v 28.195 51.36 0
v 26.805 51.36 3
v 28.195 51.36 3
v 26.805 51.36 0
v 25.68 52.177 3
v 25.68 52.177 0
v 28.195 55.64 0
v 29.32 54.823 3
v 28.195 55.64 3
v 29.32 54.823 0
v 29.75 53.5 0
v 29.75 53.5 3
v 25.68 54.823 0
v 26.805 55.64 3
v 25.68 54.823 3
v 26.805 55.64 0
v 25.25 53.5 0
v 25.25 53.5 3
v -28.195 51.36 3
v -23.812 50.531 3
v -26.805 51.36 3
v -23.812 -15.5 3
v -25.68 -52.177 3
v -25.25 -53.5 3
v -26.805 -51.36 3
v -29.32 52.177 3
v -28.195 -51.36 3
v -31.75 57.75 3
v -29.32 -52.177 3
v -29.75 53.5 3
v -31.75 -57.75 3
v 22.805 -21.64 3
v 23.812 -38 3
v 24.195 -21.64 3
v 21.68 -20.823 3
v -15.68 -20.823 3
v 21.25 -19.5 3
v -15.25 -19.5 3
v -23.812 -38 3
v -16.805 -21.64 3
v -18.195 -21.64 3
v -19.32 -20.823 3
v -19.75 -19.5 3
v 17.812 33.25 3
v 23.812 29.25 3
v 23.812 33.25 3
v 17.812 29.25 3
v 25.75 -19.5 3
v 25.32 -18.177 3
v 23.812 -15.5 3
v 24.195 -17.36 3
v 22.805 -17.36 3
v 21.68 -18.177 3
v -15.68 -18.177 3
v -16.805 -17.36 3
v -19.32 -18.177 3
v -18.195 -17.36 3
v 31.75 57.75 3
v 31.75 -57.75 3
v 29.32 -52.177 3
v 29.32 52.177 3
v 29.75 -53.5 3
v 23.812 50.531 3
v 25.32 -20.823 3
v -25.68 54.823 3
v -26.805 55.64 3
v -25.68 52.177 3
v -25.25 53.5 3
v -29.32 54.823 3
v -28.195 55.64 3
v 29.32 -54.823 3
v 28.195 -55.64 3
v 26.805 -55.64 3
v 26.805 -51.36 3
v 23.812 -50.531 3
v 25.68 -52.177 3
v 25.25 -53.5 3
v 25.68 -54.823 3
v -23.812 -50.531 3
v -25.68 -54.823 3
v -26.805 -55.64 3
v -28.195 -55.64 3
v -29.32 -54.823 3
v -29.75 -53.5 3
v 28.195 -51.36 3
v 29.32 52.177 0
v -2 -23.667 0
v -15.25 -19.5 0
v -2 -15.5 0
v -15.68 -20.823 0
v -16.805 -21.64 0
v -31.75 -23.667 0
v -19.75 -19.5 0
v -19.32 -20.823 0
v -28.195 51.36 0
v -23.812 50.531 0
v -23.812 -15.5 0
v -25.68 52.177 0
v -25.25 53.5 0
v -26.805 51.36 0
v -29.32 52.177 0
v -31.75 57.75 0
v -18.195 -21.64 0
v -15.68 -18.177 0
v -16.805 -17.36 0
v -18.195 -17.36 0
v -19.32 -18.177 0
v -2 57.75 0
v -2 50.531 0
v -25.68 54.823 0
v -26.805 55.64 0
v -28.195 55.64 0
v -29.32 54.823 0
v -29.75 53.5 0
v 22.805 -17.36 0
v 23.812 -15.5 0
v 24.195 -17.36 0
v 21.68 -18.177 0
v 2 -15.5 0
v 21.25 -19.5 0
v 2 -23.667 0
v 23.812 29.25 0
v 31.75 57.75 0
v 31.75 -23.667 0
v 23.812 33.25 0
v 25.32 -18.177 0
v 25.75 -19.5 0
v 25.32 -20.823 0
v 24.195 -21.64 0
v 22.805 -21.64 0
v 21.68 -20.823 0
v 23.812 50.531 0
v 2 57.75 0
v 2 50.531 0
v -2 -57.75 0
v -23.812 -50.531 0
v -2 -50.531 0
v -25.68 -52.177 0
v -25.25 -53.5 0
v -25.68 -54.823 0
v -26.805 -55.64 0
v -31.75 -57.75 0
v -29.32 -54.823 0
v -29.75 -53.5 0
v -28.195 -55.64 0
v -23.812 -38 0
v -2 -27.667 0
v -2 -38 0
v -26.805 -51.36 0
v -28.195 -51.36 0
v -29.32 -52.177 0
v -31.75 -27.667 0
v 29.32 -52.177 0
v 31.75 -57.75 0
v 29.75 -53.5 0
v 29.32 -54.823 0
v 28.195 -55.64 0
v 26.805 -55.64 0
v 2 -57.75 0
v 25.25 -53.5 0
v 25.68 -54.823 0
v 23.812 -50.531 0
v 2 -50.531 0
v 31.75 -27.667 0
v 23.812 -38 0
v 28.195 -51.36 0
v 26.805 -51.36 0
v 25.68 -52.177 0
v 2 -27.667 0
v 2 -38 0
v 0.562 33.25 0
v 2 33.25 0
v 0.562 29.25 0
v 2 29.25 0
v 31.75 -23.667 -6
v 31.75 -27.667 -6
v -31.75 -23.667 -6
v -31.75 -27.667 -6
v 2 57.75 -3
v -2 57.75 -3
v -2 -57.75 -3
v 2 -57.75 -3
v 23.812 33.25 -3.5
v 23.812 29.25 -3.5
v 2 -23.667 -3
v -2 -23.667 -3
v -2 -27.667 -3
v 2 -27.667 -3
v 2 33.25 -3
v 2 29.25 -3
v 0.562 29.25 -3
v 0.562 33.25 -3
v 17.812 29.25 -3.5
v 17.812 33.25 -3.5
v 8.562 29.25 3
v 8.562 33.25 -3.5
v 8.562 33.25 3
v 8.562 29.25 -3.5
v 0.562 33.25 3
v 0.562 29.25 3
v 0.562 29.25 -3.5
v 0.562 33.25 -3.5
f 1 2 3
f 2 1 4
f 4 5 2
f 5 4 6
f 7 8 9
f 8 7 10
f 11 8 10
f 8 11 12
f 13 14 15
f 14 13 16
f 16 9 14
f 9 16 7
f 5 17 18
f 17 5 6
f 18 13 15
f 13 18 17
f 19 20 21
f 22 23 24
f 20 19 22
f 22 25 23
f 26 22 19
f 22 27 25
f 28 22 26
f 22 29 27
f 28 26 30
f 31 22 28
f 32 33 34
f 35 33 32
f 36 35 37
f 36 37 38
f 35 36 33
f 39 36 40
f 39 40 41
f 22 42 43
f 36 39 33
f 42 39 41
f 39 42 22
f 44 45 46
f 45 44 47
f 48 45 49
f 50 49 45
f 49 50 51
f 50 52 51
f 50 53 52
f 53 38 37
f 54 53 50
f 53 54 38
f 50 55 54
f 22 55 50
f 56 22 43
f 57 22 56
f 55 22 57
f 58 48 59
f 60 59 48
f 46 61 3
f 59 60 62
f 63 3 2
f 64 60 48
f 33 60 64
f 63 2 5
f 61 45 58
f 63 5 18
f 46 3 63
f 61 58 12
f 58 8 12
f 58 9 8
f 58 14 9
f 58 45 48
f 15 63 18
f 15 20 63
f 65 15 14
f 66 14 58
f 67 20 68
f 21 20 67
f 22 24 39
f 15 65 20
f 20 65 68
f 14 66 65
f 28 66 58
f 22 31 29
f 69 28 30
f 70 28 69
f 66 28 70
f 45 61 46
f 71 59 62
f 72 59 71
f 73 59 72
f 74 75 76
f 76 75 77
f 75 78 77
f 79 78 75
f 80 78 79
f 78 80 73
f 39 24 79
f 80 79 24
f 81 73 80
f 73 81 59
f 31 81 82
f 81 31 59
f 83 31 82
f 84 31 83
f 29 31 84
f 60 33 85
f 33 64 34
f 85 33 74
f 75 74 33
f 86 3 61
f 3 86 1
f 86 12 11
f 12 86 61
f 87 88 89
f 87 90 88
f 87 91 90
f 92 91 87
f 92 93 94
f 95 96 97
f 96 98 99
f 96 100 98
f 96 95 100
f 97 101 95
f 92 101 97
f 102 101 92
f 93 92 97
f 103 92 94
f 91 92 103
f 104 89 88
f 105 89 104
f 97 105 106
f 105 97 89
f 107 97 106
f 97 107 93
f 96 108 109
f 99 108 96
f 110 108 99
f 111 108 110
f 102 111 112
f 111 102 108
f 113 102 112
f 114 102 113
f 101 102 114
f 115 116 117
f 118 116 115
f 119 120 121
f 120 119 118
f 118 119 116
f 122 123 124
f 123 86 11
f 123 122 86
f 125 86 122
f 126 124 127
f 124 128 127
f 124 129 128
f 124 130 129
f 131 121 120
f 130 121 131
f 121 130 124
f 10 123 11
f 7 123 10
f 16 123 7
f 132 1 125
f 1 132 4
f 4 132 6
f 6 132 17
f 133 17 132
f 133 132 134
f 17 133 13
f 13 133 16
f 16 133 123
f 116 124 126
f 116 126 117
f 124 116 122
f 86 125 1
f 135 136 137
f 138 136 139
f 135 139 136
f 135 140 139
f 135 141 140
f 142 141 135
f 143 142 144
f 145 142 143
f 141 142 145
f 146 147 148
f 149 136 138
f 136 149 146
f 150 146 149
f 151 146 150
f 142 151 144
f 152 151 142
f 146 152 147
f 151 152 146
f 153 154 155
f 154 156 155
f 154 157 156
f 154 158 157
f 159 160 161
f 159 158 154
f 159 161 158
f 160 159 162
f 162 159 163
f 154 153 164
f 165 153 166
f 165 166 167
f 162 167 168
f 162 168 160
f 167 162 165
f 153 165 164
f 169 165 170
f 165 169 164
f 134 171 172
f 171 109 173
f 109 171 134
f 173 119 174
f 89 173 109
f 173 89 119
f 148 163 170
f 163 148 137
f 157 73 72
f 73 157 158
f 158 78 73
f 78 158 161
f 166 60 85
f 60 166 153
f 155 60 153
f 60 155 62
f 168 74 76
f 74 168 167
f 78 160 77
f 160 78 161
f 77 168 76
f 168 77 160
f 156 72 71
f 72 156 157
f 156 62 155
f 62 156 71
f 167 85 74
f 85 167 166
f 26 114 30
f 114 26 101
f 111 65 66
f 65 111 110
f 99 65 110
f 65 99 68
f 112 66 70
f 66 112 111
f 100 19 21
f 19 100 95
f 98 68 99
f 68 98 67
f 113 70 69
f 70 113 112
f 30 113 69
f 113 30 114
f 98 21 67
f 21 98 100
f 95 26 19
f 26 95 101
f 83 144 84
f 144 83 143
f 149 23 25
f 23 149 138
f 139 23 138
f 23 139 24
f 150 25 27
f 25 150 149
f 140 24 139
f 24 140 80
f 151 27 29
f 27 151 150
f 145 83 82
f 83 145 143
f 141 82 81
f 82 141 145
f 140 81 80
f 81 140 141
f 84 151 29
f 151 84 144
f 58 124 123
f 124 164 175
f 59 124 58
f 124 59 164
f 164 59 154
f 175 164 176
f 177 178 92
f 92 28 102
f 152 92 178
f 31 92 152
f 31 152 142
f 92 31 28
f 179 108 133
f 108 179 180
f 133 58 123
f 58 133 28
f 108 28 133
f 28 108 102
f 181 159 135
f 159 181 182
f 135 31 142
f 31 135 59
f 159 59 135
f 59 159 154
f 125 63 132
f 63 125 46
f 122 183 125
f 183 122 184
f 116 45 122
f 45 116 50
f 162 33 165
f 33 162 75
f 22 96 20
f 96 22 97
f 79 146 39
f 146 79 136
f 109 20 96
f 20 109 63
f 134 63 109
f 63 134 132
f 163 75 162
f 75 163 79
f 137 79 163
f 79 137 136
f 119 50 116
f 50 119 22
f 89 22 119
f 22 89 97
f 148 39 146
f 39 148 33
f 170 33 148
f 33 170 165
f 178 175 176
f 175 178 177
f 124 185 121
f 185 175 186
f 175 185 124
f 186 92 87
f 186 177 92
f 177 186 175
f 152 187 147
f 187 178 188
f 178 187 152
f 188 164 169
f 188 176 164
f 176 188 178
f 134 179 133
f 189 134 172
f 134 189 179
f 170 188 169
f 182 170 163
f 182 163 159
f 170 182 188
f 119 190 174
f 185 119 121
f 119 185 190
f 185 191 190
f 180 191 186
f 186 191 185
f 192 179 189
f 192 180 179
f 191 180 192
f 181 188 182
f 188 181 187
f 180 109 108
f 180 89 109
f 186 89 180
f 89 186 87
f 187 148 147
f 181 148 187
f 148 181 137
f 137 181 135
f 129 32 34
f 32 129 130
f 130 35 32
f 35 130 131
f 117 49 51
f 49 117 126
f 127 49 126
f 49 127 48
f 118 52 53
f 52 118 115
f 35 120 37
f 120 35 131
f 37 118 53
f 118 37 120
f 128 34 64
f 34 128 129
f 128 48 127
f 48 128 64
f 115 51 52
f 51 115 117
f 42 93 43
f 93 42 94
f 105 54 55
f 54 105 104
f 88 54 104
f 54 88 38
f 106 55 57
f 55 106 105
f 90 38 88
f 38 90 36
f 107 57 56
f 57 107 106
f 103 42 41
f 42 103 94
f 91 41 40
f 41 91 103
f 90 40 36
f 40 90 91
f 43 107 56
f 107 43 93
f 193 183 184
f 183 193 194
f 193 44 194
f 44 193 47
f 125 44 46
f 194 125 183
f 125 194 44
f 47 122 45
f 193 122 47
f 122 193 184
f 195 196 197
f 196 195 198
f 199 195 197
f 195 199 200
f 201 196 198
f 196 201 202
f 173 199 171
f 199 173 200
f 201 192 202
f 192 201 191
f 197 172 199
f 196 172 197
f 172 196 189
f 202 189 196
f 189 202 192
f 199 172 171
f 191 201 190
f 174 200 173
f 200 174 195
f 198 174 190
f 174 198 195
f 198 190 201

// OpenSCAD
SOP_AGUJ_DIST_ANCHO     = 55;
SOP_AGUJ_DIST_LARGO     = 107;
SOP_AGUJ_DIST_ESPESOR   = 3; //7.5-6;
SOP_AGUJ_DIAM           = 3+1.5;
SOP_AGUJ_DIST_SEP_ESP   = 7.5-6;

LCD_AGUJ_DIST_ANCHO     = 41;
LCD_AGUJ_DIST_LARGO     = 93;
LCD_PANT_ANCHO          = 41;
LCD_PANT_LARGO          = 71.5;

BTN_AGUJ_ANCHO          = 14;
BTN_AGUJ_LARGO          = 30;

ENC_AGUJ_ANCHO          = 19;
ENC_AGUJ_LARGO          = 30;

LCD_BOARD_ANCHO         = 47+1.5;
LCD_BOARD_LARGO         = 107+1.5;

/*
module lcdBoard(espesor = 5)
{
    difference() { union() {
        cube([LCD_BOARD_ANCHO, LCD_BOARD_LARGO, espesor]);
        }
        translate([LCD_BOARD_ANCHO, LCD_BOARD_LARGO, 0])
        # hull() {
            translate([-0.001, -5.5, 0]) cube([0.001, 5.5, espesor]);
            translate([-6, -1, 0]) cube([6, 1, espesor]);
        }
    }
    
}*/

module lcdBoard(espesor = 5)
{
    difference() { union() {
        cube([LCD_BOARD_ANCHO, LCD_BOARD_LARGO, espesor]);
        }
        translate([LCD_BOARD_ANCHO, 0, 0])
        # hull() {
            translate([0, 0, 0]) cube([0.001, 5.5, espesor]);
            translate([-6, 0, 0]) cube([6, 1, espesor]);
        }
    }
    
}

module soporte_old()
{
    difference() {
        union() {
            translate([0, 0, SOP_AGUJ_DIST_ESPESOR/2]) cube([SOP_AGUJ_DIST_ANCHO+SOP_AGUJ_DIAM+2*2, SOP_AGUJ_DIST_LARGO+SOP_AGUJ_DIAM+2*2, SOP_AGUJ_DIST_ESPESOR], center = true);
        }
        for (i=[[1, 1], [1, -1], [-1, 1], [-1, -1]]) {
            translate([SOP_AGUJ_DIST_ANCHO/2*i[0], SOP_AGUJ_DIST_LARGO/2*i[1]], 0) # cylinder(d=SOP_AGUJ_DIAM, h=SOP_AGUJ_DIST_ESPESOR, $fn=10);
        }
        // LCD
        translate([
            -LCD_PANT_ANCHO/2+SOP_AGUJ_DIST_ANCHO/2-2.2, 
            -LCD_PANT_LARGO/2+SOP_AGUJ_DIST_LARGO/2-19, 
            SOP_AGUJ_DIST_ESPESOR/2
        ]) # cube([LCD_PANT_ANCHO, LCD_PANT_LARGO, SOP_AGUJ_DIST_ESPESOR], center = true);
        // Boton
        translate([
            -BTN_AGUJ_ANCHO/2+SOP_AGUJ_DIST_ANCHO/2-4, 
            -BTN_AGUJ_LARGO/2+SOP_AGUJ_DIST_LARGO/2-0, 
            SOP_AGUJ_DIST_ESPESOR/2
        ]) # cube([BTN_AGUJ_ANCHO, BTN_AGUJ_LARGO, SOP_AGUJ_DIST_ESPESOR], center = true);
        // Encoder
        translate([
            -ENC_AGUJ_ANCHO/2-BTN_AGUJ_ANCHO+SOP_AGUJ_DIST_ANCHO/2-4, 
            -BTN_AGUJ_LARGO/2+SOP_AGUJ_DIST_LARGO/2-0, 
            SOP_AGUJ_DIST_ESPESOR/2
        ]) # cube([ENC_AGUJ_ANCHO, ENC_AGUJ_LARGO, SOP_AGUJ_DIST_ESPESOR], center = true);
        // Agujeros pantalla
        # translate([
            -LCD_AGUJ_DIST_ANCHO+SOP_AGUJ_DIST_ANCHO/2-1.2,
            SOP_AGUJ_DIST_LARGO/2-2.2,
            0
        ]) cylinder(d=SOP_AGUJ_DIAM, h=SOP_AGUJ_DIST_ESPESOR+5, $fn=10);
        # translate([
            -LCD_AGUJ_DIST_ANCHO+SOP_AGUJ_DIST_ANCHO/2-1.2,
            -LCD_AGUJ_DIST_LARGO+SOP_AGUJ_DIST_LARGO/2-2.2,
            0
        ]) cylinder(d=SOP_AGUJ_DIAM, h=SOP_AGUJ_DIST_ESPESOR, $fn=10);
        # translate([
            SOP_AGUJ_DIST_ANCHO/2-1.2,
            -LCD_AGUJ_DIST_LARGO+SOP_AGUJ_DIST_LARGO/2-2.2,
            0
        ]) cylinder(d=SOP_AGUJ_DIAM, h=SOP_AGUJ_DIST_ESPESOR, $fn=10);
        // Placa LCD
        translate([
            -LCD_BOARD_ANCHO+SOP_AGUJ_DIST_ANCHO/2+2.5,
            -LCD_BOARD_LARGO+SOP_AGUJ_DIST_LARGO/2+2,
            0
        ])
            lcdBoard(SOP_AGUJ_DIST_ESPESOR-SOP_AGUJ_DIST_SEP_ESP);
    }
}

module soporte()
{
    difference() { union() {
            difference() {
                union() {
                    translate([0, 0, SOP_AGUJ_DIST_ESPESOR/2]) 
                        cube([SOP_AGUJ_DIST_ANCHO+SOP_AGUJ_DIAM+2*2, SOP_AGUJ_DIST_LARGO+SOP_AGUJ_DIAM+2*2, SOP_AGUJ_DIST_ESPESOR], center = true);
                }
                // agujeros lados
                for (i=[[1, 1], [1, -1], [-1, 1], [-1, -1]]) {
                    translate([SOP_AGUJ_DIST_ANCHO/2*i[0], SOP_AGUJ_DIST_LARGO/2*i[1]], 0) # cylinder(d=SOP_AGUJ_DIAM, h=SOP_AGUJ_DIST_ESPESOR, $fn=10);
                }
                translate([0, 0, SOP_AGUJ_DIST_ESPESOR/2]) 
                       # cube([(SOP_AGUJ_DIST_ANCHO+SOP_AGUJ_DIAM+2*2)*6/8, (SOP_AGUJ_DIST_LARGO+SOP_AGUJ_DIAM+2*2)*7/8, SOP_AGUJ_DIST_ESPESOR], center = true);
            }
            translate([0, -SOP_AGUJ_DIST_LARGO/4, SOP_AGUJ_DIST_ESPESOR/2]) 
                cube([SOP_AGUJ_DIST_ANCHO+SOP_AGUJ_DIAM+2*2, 22.5, SOP_AGUJ_DIST_ESPESOR], center = true);
            
            translate([0, -SOP_AGUJ_DIST_LARGO/3+10, -9/2+SOP_AGUJ_DIST_ESPESOR]) 
                cube([SOP_AGUJ_DIST_ANCHO+SOP_AGUJ_DIAM+2*2, 4, 9], center = true);
            
            translate([0, 0, -SOP_AGUJ_DIST_ESPESOR/2]) 
                cube([4, SOP_AGUJ_DIST_LARGO+SOP_AGUJ_DIAM+2*2, SOP_AGUJ_DIST_ESPESOR], center = true);
        }
        // Agujeros pantalla
        # translate([
            SOP_AGUJ_DIST_ANCHO/2-4,
            -SOP_AGUJ_DIST_LARGO/2+34,
            0
        ]) cylinder(d=SOP_AGUJ_DIAM, h=SOP_AGUJ_DIST_ESPESOR, $fn=10);
        # translate([
            SOP_AGUJ_DIST_ANCHO/2-4-LCD_AGUJ_DIST_ANCHO,
            -SOP_AGUJ_DIST_LARGO/2+34,
            0
        ]) cylinder(d=SOP_AGUJ_DIAM, h=SOP_AGUJ_DIST_ESPESOR, $fn=10);
    }
    // bloque soporte lcd
    translate([
        (SOP_AGUJ_DIST_ANCHO+SOP_AGUJ_DIAM+2*2)*6/8/2+-6/2, 
        -(SOP_AGUJ_DIST_LARGO+SOP_AGUJ_DIAM+2*2)/2+4/2+87, 
        -6.5/2+SOP_AGUJ_DIST_ESPESOR
    ]) 
        cube([6, 4, 6.5], center=true);
    translate([
        (SOP_AGUJ_DIST_ANCHO+SOP_AGUJ_DIAM+2*2)*6/8/2+-4.5/2 -5-3-9 , 
        -(SOP_AGUJ_DIST_LARGO+SOP_AGUJ_DIAM+2*2)/2+4/2+87, 
        -6.5/2+SOP_AGUJ_DIST_ESPESOR
    ]) 
        cube([5+3, 4, 6.5], center=true);
}

soporte();
//lcdBoard();
